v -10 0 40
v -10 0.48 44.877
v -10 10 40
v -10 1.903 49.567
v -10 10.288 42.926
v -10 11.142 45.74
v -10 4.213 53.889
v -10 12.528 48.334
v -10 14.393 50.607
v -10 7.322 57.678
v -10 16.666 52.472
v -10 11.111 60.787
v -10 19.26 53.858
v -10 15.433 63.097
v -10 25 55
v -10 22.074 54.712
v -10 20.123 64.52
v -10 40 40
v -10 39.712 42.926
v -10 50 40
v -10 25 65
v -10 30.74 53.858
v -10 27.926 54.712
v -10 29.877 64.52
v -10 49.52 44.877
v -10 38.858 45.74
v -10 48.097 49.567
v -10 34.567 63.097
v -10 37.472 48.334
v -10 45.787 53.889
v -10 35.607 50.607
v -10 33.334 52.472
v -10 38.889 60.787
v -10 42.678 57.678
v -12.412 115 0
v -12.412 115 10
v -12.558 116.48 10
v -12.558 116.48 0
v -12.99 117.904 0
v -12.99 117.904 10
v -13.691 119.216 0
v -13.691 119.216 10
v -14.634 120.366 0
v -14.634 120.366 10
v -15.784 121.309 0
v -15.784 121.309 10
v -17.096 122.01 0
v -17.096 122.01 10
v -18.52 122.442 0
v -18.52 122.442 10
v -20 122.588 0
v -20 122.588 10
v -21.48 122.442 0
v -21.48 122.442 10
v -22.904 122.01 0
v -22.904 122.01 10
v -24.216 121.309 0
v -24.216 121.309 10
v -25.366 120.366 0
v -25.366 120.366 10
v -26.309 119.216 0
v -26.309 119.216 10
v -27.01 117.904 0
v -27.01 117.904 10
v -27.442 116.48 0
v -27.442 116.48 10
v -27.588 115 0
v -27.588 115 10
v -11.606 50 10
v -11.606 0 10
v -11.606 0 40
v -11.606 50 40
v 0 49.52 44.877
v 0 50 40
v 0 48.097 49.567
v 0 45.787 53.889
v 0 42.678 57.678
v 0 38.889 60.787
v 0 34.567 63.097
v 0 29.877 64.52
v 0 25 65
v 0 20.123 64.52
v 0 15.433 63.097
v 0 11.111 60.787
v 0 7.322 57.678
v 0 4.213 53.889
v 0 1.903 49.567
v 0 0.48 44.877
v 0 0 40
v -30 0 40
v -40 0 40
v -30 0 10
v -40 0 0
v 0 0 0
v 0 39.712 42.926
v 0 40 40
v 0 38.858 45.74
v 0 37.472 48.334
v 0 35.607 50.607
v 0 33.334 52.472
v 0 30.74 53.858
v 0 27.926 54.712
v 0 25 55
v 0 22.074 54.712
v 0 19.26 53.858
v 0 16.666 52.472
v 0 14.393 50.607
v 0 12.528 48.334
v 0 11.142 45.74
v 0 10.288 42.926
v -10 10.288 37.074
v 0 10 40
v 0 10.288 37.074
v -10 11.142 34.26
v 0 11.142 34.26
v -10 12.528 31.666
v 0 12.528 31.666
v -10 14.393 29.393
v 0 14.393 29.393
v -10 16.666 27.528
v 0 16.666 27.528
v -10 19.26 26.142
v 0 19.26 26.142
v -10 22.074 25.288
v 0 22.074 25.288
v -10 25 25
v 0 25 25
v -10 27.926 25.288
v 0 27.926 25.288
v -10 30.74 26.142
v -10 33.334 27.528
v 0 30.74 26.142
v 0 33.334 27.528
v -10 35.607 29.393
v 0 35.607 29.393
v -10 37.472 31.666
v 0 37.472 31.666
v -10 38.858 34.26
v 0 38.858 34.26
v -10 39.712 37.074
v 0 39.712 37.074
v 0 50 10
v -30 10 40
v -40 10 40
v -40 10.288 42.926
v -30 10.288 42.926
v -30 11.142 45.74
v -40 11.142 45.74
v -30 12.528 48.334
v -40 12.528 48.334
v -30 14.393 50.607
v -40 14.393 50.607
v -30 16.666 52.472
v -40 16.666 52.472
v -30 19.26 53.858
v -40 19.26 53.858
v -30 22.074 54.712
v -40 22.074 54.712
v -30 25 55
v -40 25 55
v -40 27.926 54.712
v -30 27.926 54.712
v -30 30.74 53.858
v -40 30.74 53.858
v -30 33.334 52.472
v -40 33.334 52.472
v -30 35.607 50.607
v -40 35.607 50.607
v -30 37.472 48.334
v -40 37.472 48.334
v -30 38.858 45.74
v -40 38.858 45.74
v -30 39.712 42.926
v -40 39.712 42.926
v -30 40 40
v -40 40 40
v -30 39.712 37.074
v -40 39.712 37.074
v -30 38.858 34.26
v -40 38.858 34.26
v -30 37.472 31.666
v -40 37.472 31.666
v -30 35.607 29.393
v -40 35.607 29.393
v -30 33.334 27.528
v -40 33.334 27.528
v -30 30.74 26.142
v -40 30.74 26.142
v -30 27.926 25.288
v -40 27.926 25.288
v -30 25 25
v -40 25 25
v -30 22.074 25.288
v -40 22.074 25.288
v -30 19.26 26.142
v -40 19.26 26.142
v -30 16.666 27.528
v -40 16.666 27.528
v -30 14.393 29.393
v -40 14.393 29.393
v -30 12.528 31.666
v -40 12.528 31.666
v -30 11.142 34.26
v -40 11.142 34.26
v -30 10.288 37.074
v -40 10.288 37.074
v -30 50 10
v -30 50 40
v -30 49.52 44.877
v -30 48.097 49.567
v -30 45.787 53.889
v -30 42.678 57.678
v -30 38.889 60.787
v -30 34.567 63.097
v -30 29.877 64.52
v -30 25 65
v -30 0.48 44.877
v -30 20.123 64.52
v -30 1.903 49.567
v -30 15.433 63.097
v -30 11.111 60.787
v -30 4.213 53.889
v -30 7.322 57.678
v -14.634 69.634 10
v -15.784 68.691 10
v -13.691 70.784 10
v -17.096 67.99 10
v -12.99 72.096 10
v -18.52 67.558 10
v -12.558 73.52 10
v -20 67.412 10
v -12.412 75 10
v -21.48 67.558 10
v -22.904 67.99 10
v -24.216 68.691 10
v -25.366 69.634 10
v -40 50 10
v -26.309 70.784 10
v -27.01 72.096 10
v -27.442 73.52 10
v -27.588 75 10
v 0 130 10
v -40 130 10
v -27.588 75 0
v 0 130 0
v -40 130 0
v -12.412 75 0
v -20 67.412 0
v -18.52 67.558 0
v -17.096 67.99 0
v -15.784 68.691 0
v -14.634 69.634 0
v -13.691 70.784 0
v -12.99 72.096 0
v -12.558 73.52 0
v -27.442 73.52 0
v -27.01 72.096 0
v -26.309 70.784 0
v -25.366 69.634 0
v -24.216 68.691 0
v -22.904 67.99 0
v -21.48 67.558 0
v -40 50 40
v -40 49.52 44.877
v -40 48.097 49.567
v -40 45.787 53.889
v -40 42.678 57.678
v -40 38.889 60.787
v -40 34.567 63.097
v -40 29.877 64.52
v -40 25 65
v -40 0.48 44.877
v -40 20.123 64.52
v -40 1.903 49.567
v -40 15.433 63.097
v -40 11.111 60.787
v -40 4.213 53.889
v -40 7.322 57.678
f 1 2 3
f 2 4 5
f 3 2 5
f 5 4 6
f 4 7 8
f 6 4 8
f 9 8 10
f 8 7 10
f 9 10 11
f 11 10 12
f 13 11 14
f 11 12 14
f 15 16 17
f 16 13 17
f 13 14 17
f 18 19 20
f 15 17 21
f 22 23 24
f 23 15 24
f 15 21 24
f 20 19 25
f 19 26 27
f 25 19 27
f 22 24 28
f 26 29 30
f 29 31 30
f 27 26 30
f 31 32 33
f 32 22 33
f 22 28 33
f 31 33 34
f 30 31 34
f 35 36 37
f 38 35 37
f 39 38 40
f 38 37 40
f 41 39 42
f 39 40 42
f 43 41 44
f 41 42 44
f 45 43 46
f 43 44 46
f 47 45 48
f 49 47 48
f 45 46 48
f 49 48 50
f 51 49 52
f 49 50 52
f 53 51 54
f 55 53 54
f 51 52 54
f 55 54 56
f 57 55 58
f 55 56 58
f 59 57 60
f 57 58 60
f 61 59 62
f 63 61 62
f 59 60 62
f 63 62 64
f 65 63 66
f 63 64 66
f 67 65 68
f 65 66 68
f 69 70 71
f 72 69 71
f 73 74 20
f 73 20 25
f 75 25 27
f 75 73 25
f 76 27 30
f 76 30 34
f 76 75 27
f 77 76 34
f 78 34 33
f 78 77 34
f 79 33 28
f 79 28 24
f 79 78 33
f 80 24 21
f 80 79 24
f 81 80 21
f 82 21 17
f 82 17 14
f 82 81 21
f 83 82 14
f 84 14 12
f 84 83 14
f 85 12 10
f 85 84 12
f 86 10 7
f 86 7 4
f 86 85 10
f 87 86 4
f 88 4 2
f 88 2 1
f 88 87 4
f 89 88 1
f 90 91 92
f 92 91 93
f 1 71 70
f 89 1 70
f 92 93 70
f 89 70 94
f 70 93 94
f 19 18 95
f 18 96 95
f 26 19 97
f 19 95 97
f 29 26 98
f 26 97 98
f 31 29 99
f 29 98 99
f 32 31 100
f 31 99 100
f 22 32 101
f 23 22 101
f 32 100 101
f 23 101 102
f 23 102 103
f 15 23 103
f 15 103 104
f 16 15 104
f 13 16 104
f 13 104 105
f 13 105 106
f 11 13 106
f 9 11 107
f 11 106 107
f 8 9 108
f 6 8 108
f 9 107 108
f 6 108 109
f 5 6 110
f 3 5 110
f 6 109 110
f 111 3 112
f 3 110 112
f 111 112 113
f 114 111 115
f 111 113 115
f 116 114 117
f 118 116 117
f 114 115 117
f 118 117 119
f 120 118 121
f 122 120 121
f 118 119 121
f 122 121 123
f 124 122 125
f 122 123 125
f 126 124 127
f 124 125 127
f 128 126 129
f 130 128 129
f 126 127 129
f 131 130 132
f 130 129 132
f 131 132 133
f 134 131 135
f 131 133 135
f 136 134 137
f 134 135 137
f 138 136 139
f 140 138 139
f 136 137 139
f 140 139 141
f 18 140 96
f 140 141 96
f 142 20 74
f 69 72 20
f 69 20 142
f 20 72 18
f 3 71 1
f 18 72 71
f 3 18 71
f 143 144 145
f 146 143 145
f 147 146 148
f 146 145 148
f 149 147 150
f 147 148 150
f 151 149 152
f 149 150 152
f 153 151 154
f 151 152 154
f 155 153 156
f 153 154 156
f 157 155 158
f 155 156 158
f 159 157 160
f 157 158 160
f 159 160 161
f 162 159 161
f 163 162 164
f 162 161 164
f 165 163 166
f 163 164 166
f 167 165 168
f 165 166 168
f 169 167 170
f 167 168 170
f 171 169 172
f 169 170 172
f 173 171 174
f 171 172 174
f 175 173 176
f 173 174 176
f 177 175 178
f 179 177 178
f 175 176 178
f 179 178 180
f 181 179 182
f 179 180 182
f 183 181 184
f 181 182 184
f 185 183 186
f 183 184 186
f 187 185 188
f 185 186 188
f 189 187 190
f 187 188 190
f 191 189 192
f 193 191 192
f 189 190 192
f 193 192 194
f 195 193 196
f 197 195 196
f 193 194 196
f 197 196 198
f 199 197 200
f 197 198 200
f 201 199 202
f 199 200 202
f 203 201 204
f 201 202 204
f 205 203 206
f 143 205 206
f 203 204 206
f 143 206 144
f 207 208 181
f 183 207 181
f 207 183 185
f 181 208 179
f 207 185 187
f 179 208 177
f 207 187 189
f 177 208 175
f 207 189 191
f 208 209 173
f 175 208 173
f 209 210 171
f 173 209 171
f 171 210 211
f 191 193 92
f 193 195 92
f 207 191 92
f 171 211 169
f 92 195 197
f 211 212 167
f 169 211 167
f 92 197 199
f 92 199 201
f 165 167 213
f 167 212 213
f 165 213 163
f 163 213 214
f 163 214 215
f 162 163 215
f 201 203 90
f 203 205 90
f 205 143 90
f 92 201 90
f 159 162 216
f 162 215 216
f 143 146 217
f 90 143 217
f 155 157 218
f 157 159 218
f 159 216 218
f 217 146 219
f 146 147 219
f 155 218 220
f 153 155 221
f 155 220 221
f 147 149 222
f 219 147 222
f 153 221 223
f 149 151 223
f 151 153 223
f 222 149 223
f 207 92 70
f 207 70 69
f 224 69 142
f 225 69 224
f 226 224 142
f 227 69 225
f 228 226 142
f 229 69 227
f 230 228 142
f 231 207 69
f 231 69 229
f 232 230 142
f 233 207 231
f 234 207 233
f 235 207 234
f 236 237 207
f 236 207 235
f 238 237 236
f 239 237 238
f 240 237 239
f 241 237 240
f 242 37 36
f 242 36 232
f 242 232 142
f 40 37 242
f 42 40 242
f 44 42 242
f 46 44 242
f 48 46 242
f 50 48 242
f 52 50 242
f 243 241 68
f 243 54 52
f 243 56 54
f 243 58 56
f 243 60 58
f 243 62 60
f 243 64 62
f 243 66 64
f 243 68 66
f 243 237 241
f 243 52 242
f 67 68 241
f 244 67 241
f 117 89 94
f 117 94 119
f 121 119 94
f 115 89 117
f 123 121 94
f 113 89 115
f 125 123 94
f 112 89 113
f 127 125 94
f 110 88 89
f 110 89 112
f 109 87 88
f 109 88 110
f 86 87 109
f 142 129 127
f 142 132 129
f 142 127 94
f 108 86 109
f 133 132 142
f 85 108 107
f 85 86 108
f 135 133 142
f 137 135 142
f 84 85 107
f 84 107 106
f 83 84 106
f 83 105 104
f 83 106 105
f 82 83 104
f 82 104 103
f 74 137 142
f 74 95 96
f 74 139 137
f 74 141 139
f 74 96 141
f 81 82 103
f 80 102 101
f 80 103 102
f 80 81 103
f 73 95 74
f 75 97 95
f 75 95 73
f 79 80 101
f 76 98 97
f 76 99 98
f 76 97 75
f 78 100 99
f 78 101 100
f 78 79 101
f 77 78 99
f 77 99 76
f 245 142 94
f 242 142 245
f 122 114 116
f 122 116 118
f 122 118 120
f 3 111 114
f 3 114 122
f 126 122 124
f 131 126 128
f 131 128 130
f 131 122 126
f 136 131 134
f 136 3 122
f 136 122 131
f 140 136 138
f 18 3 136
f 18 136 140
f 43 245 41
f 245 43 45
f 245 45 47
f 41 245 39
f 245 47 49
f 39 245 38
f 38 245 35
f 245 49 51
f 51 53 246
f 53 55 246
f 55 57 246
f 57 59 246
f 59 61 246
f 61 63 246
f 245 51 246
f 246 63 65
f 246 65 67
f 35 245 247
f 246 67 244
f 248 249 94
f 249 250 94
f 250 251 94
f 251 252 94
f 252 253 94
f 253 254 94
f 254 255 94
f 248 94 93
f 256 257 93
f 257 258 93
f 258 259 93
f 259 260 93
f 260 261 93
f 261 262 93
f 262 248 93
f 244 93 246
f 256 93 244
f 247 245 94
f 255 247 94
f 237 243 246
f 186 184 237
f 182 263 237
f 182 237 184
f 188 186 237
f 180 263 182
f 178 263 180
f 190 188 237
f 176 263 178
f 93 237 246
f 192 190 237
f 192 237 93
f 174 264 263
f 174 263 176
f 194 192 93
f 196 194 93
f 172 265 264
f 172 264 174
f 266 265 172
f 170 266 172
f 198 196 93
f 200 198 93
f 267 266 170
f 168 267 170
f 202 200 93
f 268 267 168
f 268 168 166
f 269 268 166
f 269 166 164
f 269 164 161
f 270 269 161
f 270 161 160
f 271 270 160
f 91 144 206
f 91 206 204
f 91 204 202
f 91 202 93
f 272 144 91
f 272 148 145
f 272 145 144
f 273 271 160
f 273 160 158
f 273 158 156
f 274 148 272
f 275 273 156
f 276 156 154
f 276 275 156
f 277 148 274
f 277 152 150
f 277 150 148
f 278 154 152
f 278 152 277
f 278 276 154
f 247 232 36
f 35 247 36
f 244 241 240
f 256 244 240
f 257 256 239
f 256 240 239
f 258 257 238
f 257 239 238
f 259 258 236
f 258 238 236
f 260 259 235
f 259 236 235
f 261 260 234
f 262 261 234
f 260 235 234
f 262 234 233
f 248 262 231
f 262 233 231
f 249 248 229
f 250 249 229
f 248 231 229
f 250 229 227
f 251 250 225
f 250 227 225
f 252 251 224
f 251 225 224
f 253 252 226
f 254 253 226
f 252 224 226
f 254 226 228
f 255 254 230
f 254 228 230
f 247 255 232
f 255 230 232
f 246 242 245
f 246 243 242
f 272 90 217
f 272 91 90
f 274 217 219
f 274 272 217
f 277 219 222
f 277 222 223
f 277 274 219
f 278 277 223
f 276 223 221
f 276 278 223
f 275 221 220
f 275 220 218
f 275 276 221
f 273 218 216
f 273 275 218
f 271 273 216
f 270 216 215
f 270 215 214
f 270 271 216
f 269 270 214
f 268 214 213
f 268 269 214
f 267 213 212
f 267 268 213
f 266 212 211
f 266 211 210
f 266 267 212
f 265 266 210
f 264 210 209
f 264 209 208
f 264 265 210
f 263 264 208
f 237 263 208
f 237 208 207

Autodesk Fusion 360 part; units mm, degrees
sketch "Sketch1" plane through (0, 0, 0) normal (0, 1, 0) x (1, 0, 0)
  line L0 (0, 0) -> (-40, 0)
  line L1 (-40, 0) -> (-40, -40)
  line L2 (0, -40) -> (0, 0)
  line L3 (-40, -40) -> (-30, -40)
  line L4 (-30, -40) -> (-30, -10)
  line L5 (-30, -10) -> (-11.6065, -10)
  line L6 (-11.6065, -10) -> (-11.6065, -40)
  line L7 (-11.6065, -40) -> (0, -40)
  dimension "d6" = 40
  dimension "d7" = 40
  dimension "d8" = 10
  dimension "d9" = 11.6065
  dimension "d10" = 10
extrude "Extrude1" add sketch "Sketch1" along normal blind 130
sketch "Sketch2" plane through (-40, 0, 0) normal (-1, 0, 0) x (0, -1, 0)
  line L0 (0, 0) -> (0, 40)
  line L1 (0, 40) -> (-130, 40)
  line L2 (-130, 40) -> (-130, 0)
  line L3 (-130, 0) -> (0, 0)
  circle A0 centre (-25, 40) radius 15
  arc A1 (0, 40) -> (-50, 40) centre (-25, 40) ccw
  line L4 (-50, 40) -> (-50, 10)
  line L5 (-50, 10) -> (-130, 10)
  dimension "d13" = 50
  dimension "d14" = 30
  dimension "d15" = 25
  dimension "d16" = 30
extrude "Extrude2" add sketch "Sketch2" against normal blind 10 contours L1 A0 A1
extrude "Extrude3" cut sketch "Sketch2" against normal blind 10 contours L1 A0 | L1 A0
extrude "Extrude4" cut sketch "Sketch2" against normal blind 10 contours L1 L2 L4 L5
extrude "Extrude5" add sketch "Sketch2" against normal blind 10 contours L1 L2 L4 L5
sketch "Sketch3" plane through (-40, 0, 0) normal (-1, 0, 0) x (0, -1, 0)
  line L0 (-130, 10) -> (-130, 0)
  line L1 (-130, 0) -> (0, 0)
  line L2 (0, 0) -> (0, 40)
extrude "Extrude6" cut sketch "Sketch2" against normal blind 66.91 contours L1 L2 L4 L5
sketch "Sketch4" plane through (0, 0, 0) normal (1, 0, 0) x (0, 1, 0)
  line L0 (130, 10) -> (50, 10)
  line L1 (50, 10) -> (50, 40)
  line L2 (50, 40) -> (0, 40)
  line L3 (0, 40) -> (0, 0)
  line L4 (0, 0) -> (130, 0)
  line L5 (130, 0) -> (130, 10)
  circle A0 centre (25, 40) radius 15
  arc A1 (50, 40) -> (0, 40) centre (25, 40) ccw
  dimension "d27" = 50
  dimension "d28" = 30
extrude "Extrude7" cut sketch "Sketch4" against normal blind 10 contours L2 A0 A1 | L2 A0 | L2 A0
extrude "Extrude8" add sketch "Sketch4" against normal blind 10 contours L2 A0 A1
sketch "Sketch5" plane through (0, 0, 10) normal (0, 0, 1) x (-1, 0, 0)
  line L0 (30, -50) -> (30, 0)
  line L1 (30, 0) -> (11.6065, 0)
  line L2 (11.6065, 0) -> (11.6065, -50)
  line L3 (11.6065, -50) -> (0, -50)
  line L4 (0, -50) -> (0, -130)
  line L5 (0, -130) -> (40, -130)
  line L6 (40, -130) -> (40, -50)
  line L7 (40, -50) -> (30, -50)
  line L8 (12.4119, -75) -> (12.4119, -115)
  arc A0 (12.4119, -115) -> (27.5881, -115) centre (20, -115) ccw
  line L9 (27.5881, -115) -> (27.5881, -75)
  arc A1 (27.5881, -75) -> (12.4119, -75) centre (20, -75) ccw
  line L10 (20, -75) -> (20, -115) construction
  point P0 (20, -95)
  dimension "d33" = 40
extrude "Extrude9" cut sketch "Sketch5" against normal blind 34.041 contours L8 A0 L9 A1
